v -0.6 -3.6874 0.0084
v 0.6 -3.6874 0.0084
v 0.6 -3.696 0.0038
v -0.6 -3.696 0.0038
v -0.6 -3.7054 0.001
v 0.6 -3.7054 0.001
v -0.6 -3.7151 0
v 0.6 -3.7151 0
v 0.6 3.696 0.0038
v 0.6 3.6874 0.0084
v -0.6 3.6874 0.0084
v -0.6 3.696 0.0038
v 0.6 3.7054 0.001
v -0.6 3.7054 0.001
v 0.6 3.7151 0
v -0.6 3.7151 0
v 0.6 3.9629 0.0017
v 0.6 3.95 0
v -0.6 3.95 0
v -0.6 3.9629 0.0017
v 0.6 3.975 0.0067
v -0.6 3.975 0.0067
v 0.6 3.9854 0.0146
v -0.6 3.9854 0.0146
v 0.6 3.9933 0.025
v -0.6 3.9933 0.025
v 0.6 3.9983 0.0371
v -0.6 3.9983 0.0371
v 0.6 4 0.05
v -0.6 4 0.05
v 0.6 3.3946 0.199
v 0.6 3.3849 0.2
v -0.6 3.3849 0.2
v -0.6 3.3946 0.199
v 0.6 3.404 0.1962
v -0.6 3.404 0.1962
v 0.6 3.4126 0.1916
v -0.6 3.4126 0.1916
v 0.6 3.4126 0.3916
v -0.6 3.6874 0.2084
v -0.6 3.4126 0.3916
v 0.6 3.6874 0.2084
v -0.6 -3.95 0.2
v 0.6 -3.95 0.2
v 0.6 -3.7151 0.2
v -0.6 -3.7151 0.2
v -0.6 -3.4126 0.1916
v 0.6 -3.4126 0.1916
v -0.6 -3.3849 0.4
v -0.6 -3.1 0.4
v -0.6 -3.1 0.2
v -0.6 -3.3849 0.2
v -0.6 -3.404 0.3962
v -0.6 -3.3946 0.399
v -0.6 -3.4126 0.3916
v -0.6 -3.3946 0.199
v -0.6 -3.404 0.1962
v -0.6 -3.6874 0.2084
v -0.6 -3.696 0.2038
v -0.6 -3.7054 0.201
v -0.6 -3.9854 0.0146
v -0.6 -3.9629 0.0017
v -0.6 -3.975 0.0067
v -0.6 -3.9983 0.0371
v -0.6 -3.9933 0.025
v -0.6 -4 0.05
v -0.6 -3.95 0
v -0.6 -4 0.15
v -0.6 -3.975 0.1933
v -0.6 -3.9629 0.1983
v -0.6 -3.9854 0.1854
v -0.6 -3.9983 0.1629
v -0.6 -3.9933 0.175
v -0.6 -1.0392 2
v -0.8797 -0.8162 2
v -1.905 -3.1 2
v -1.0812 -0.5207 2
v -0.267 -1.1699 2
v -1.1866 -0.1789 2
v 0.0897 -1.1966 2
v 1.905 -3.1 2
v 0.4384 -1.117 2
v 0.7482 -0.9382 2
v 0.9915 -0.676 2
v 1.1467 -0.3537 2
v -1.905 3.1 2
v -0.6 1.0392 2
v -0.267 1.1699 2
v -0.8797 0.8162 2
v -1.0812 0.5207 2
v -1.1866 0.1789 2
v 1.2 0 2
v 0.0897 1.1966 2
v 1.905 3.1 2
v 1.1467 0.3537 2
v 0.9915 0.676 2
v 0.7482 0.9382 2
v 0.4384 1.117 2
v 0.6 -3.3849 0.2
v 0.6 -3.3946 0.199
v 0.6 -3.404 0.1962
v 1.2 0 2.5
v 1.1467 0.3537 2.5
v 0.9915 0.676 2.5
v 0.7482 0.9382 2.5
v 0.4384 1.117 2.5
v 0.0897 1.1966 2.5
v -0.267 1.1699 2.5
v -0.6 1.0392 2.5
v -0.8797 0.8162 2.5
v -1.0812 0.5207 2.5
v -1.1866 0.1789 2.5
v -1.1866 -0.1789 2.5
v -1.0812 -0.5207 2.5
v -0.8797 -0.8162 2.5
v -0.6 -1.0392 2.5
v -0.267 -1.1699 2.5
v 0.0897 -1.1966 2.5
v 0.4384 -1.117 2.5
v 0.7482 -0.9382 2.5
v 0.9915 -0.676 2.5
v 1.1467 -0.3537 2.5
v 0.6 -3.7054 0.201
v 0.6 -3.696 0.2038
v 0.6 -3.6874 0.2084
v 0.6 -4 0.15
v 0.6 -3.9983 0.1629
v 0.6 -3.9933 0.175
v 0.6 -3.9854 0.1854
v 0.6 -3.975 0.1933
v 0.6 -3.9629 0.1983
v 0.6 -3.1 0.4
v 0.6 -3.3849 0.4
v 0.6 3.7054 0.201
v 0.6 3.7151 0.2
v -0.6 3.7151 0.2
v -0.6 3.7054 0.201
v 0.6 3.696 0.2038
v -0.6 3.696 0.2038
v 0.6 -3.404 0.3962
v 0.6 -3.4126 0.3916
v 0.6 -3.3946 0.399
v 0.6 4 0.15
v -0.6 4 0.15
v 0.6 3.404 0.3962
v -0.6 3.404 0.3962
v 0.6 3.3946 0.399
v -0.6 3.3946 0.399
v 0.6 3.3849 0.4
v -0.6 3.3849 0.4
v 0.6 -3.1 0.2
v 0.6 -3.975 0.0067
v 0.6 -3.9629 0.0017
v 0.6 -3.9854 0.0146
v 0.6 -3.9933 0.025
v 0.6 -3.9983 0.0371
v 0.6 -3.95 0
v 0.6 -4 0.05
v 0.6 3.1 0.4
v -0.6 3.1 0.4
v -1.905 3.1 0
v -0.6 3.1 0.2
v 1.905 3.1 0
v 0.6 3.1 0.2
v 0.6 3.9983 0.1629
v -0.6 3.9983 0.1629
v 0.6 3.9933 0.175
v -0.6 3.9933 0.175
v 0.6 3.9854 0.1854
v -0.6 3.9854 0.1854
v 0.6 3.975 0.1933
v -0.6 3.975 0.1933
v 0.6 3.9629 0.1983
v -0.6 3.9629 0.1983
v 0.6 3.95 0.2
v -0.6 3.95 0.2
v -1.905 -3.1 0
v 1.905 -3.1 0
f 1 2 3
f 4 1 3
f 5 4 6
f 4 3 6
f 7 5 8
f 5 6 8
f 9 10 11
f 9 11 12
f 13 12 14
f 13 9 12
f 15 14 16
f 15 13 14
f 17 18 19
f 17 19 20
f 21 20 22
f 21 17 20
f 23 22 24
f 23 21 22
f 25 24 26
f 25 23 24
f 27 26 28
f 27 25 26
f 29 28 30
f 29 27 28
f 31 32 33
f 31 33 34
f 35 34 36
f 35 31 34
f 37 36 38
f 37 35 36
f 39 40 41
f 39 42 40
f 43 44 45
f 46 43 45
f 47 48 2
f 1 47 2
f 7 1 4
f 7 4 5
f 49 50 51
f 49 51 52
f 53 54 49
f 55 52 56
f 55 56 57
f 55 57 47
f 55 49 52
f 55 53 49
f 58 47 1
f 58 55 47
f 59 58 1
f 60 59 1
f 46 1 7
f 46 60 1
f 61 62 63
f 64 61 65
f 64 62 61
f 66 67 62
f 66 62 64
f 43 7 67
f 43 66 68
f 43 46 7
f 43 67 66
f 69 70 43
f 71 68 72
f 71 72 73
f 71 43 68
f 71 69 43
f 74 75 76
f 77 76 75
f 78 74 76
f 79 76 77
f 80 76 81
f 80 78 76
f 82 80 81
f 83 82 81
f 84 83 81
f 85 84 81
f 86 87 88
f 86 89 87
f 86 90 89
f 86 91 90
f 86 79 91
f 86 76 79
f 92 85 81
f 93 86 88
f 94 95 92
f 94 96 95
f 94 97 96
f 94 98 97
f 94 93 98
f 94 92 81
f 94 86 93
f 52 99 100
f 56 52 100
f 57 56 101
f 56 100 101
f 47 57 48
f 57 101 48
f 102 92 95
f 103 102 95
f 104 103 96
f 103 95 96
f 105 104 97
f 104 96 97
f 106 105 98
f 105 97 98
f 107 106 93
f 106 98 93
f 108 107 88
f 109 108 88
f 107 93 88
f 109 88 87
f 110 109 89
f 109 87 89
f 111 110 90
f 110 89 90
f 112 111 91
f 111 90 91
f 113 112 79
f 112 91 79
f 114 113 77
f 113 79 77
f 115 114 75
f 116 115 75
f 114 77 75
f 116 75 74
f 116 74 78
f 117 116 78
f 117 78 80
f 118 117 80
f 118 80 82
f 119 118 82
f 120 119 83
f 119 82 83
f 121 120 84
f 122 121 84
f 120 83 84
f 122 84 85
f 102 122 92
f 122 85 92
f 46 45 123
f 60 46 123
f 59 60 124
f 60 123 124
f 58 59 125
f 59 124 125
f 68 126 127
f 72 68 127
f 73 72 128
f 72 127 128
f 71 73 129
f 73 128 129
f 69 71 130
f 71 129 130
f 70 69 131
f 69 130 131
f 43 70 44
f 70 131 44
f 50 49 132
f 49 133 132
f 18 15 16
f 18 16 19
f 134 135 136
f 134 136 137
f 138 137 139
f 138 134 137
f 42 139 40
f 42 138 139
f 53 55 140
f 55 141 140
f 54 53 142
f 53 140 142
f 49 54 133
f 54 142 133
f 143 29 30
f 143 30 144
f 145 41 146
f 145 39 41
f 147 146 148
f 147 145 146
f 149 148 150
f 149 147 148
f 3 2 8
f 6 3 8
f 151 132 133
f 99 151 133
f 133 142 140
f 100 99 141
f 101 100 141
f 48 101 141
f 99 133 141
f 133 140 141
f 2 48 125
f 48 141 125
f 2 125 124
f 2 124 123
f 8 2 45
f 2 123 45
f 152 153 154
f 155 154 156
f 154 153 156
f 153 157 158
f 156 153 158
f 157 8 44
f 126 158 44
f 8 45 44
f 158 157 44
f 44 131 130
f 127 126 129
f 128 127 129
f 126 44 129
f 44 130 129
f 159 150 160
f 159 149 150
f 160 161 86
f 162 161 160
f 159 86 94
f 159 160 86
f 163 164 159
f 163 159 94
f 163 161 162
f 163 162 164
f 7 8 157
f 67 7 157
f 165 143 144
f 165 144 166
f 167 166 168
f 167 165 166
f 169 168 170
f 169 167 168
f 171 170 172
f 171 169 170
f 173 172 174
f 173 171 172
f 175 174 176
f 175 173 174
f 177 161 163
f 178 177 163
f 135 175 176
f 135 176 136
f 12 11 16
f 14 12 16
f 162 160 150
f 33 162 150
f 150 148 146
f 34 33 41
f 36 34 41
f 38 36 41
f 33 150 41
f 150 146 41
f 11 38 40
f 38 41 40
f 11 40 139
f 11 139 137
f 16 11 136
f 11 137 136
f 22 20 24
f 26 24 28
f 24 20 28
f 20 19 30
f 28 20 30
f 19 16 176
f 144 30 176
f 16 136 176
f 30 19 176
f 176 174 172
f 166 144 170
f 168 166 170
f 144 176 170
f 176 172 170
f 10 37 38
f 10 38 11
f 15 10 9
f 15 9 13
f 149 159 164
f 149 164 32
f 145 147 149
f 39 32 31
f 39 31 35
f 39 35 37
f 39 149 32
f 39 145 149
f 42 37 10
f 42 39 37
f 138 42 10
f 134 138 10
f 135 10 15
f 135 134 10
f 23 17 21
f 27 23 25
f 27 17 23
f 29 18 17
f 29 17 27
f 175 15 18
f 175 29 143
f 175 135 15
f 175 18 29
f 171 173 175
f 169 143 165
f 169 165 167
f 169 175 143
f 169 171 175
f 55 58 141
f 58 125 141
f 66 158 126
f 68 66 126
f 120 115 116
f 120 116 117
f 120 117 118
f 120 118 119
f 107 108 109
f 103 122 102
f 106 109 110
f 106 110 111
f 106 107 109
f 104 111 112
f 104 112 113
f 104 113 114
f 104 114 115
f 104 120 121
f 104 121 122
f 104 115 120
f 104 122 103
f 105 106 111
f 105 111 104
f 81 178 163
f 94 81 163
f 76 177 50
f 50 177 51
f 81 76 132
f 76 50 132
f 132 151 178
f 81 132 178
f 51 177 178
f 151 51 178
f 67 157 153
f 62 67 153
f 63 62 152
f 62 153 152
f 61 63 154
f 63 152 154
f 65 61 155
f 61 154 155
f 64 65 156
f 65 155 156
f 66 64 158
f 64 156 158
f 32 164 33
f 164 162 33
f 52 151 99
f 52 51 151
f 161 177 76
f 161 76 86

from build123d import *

# Parameters (mm, degrees)
F0_W          = 3.81
F0_H          = 6.2
F1_DEPTH      = 2
F2_R          = 1.2
F3_DEPTH      = 0.5
F5_DEPTH      = 0.6
F5_DEPTH_BACK = 0.6


with BuildPart() as f1:
    # F0 (on Top) → F1 (new body)
    with BuildSketch(Plane.XY):
        Rectangle(F0_W, F0_H)
    extrude(amount=F1_DEPTH)

    # F2 (on face) → F3 (join)
    with BuildSketch(Plane.XY.offset(2)):
        Circle(F2_R)
    extrude(amount=F3_DEPTH)

    # F4 (on Right) → F5 (join, two sides)
    with BuildSketch(Plane.YZ) as f5_sk:
        with BuildLine():
            Line((3.384861, 0.4), (3.1, 0.4))
            Line((3.1, 0.4), (3.1, 0.2))
            Line((3.1, 0.2), (3.384861, 0.2))
            ThreePointArc((3.384861, 0.2), (3.39935, 0.197855), (3.412596, 0.191603))
            Line((3.412596, 0.191603), (3.687404, 0.008397))
            ThreePointArc((3.687404, 0.008397), (3.70065, 0.002145), (3.715139, 0))
            Line((3.715139, 0), (3.95, 0))
            ThreePointArc((3.95, 0), (3.985355, 0.014645), (4, 0.05))
            Line((4, 0.05), (4, 0.15))
            ThreePointArc((4, 0.15), (3.985355, 0.185355), (3.95, 0.2))
            Line((3.95, 0.2), (3.715139, 0.2))
            ThreePointArc((3.715139, 0.2), (3.70065, 0.202145), (3.687404, 0.208397))
            Line((3.687404, 0.208397), (3.412596, 0.391603))
            ThreePointArc((3.412596, 0.391603), (3.39935, 0.397855), (3.384861, 0.4))
        make_face()
    extrude(amount=F5_DEPTH)
    extrude(f5_sk.sketch, amount=-F5_DEPTH_BACK)

    # F6: F1 across plane


with BuildPart() as f1_1:
    add(f1.part)
    add(f1.part.mirror(Plane.XZ))


solid = f1_1.part
